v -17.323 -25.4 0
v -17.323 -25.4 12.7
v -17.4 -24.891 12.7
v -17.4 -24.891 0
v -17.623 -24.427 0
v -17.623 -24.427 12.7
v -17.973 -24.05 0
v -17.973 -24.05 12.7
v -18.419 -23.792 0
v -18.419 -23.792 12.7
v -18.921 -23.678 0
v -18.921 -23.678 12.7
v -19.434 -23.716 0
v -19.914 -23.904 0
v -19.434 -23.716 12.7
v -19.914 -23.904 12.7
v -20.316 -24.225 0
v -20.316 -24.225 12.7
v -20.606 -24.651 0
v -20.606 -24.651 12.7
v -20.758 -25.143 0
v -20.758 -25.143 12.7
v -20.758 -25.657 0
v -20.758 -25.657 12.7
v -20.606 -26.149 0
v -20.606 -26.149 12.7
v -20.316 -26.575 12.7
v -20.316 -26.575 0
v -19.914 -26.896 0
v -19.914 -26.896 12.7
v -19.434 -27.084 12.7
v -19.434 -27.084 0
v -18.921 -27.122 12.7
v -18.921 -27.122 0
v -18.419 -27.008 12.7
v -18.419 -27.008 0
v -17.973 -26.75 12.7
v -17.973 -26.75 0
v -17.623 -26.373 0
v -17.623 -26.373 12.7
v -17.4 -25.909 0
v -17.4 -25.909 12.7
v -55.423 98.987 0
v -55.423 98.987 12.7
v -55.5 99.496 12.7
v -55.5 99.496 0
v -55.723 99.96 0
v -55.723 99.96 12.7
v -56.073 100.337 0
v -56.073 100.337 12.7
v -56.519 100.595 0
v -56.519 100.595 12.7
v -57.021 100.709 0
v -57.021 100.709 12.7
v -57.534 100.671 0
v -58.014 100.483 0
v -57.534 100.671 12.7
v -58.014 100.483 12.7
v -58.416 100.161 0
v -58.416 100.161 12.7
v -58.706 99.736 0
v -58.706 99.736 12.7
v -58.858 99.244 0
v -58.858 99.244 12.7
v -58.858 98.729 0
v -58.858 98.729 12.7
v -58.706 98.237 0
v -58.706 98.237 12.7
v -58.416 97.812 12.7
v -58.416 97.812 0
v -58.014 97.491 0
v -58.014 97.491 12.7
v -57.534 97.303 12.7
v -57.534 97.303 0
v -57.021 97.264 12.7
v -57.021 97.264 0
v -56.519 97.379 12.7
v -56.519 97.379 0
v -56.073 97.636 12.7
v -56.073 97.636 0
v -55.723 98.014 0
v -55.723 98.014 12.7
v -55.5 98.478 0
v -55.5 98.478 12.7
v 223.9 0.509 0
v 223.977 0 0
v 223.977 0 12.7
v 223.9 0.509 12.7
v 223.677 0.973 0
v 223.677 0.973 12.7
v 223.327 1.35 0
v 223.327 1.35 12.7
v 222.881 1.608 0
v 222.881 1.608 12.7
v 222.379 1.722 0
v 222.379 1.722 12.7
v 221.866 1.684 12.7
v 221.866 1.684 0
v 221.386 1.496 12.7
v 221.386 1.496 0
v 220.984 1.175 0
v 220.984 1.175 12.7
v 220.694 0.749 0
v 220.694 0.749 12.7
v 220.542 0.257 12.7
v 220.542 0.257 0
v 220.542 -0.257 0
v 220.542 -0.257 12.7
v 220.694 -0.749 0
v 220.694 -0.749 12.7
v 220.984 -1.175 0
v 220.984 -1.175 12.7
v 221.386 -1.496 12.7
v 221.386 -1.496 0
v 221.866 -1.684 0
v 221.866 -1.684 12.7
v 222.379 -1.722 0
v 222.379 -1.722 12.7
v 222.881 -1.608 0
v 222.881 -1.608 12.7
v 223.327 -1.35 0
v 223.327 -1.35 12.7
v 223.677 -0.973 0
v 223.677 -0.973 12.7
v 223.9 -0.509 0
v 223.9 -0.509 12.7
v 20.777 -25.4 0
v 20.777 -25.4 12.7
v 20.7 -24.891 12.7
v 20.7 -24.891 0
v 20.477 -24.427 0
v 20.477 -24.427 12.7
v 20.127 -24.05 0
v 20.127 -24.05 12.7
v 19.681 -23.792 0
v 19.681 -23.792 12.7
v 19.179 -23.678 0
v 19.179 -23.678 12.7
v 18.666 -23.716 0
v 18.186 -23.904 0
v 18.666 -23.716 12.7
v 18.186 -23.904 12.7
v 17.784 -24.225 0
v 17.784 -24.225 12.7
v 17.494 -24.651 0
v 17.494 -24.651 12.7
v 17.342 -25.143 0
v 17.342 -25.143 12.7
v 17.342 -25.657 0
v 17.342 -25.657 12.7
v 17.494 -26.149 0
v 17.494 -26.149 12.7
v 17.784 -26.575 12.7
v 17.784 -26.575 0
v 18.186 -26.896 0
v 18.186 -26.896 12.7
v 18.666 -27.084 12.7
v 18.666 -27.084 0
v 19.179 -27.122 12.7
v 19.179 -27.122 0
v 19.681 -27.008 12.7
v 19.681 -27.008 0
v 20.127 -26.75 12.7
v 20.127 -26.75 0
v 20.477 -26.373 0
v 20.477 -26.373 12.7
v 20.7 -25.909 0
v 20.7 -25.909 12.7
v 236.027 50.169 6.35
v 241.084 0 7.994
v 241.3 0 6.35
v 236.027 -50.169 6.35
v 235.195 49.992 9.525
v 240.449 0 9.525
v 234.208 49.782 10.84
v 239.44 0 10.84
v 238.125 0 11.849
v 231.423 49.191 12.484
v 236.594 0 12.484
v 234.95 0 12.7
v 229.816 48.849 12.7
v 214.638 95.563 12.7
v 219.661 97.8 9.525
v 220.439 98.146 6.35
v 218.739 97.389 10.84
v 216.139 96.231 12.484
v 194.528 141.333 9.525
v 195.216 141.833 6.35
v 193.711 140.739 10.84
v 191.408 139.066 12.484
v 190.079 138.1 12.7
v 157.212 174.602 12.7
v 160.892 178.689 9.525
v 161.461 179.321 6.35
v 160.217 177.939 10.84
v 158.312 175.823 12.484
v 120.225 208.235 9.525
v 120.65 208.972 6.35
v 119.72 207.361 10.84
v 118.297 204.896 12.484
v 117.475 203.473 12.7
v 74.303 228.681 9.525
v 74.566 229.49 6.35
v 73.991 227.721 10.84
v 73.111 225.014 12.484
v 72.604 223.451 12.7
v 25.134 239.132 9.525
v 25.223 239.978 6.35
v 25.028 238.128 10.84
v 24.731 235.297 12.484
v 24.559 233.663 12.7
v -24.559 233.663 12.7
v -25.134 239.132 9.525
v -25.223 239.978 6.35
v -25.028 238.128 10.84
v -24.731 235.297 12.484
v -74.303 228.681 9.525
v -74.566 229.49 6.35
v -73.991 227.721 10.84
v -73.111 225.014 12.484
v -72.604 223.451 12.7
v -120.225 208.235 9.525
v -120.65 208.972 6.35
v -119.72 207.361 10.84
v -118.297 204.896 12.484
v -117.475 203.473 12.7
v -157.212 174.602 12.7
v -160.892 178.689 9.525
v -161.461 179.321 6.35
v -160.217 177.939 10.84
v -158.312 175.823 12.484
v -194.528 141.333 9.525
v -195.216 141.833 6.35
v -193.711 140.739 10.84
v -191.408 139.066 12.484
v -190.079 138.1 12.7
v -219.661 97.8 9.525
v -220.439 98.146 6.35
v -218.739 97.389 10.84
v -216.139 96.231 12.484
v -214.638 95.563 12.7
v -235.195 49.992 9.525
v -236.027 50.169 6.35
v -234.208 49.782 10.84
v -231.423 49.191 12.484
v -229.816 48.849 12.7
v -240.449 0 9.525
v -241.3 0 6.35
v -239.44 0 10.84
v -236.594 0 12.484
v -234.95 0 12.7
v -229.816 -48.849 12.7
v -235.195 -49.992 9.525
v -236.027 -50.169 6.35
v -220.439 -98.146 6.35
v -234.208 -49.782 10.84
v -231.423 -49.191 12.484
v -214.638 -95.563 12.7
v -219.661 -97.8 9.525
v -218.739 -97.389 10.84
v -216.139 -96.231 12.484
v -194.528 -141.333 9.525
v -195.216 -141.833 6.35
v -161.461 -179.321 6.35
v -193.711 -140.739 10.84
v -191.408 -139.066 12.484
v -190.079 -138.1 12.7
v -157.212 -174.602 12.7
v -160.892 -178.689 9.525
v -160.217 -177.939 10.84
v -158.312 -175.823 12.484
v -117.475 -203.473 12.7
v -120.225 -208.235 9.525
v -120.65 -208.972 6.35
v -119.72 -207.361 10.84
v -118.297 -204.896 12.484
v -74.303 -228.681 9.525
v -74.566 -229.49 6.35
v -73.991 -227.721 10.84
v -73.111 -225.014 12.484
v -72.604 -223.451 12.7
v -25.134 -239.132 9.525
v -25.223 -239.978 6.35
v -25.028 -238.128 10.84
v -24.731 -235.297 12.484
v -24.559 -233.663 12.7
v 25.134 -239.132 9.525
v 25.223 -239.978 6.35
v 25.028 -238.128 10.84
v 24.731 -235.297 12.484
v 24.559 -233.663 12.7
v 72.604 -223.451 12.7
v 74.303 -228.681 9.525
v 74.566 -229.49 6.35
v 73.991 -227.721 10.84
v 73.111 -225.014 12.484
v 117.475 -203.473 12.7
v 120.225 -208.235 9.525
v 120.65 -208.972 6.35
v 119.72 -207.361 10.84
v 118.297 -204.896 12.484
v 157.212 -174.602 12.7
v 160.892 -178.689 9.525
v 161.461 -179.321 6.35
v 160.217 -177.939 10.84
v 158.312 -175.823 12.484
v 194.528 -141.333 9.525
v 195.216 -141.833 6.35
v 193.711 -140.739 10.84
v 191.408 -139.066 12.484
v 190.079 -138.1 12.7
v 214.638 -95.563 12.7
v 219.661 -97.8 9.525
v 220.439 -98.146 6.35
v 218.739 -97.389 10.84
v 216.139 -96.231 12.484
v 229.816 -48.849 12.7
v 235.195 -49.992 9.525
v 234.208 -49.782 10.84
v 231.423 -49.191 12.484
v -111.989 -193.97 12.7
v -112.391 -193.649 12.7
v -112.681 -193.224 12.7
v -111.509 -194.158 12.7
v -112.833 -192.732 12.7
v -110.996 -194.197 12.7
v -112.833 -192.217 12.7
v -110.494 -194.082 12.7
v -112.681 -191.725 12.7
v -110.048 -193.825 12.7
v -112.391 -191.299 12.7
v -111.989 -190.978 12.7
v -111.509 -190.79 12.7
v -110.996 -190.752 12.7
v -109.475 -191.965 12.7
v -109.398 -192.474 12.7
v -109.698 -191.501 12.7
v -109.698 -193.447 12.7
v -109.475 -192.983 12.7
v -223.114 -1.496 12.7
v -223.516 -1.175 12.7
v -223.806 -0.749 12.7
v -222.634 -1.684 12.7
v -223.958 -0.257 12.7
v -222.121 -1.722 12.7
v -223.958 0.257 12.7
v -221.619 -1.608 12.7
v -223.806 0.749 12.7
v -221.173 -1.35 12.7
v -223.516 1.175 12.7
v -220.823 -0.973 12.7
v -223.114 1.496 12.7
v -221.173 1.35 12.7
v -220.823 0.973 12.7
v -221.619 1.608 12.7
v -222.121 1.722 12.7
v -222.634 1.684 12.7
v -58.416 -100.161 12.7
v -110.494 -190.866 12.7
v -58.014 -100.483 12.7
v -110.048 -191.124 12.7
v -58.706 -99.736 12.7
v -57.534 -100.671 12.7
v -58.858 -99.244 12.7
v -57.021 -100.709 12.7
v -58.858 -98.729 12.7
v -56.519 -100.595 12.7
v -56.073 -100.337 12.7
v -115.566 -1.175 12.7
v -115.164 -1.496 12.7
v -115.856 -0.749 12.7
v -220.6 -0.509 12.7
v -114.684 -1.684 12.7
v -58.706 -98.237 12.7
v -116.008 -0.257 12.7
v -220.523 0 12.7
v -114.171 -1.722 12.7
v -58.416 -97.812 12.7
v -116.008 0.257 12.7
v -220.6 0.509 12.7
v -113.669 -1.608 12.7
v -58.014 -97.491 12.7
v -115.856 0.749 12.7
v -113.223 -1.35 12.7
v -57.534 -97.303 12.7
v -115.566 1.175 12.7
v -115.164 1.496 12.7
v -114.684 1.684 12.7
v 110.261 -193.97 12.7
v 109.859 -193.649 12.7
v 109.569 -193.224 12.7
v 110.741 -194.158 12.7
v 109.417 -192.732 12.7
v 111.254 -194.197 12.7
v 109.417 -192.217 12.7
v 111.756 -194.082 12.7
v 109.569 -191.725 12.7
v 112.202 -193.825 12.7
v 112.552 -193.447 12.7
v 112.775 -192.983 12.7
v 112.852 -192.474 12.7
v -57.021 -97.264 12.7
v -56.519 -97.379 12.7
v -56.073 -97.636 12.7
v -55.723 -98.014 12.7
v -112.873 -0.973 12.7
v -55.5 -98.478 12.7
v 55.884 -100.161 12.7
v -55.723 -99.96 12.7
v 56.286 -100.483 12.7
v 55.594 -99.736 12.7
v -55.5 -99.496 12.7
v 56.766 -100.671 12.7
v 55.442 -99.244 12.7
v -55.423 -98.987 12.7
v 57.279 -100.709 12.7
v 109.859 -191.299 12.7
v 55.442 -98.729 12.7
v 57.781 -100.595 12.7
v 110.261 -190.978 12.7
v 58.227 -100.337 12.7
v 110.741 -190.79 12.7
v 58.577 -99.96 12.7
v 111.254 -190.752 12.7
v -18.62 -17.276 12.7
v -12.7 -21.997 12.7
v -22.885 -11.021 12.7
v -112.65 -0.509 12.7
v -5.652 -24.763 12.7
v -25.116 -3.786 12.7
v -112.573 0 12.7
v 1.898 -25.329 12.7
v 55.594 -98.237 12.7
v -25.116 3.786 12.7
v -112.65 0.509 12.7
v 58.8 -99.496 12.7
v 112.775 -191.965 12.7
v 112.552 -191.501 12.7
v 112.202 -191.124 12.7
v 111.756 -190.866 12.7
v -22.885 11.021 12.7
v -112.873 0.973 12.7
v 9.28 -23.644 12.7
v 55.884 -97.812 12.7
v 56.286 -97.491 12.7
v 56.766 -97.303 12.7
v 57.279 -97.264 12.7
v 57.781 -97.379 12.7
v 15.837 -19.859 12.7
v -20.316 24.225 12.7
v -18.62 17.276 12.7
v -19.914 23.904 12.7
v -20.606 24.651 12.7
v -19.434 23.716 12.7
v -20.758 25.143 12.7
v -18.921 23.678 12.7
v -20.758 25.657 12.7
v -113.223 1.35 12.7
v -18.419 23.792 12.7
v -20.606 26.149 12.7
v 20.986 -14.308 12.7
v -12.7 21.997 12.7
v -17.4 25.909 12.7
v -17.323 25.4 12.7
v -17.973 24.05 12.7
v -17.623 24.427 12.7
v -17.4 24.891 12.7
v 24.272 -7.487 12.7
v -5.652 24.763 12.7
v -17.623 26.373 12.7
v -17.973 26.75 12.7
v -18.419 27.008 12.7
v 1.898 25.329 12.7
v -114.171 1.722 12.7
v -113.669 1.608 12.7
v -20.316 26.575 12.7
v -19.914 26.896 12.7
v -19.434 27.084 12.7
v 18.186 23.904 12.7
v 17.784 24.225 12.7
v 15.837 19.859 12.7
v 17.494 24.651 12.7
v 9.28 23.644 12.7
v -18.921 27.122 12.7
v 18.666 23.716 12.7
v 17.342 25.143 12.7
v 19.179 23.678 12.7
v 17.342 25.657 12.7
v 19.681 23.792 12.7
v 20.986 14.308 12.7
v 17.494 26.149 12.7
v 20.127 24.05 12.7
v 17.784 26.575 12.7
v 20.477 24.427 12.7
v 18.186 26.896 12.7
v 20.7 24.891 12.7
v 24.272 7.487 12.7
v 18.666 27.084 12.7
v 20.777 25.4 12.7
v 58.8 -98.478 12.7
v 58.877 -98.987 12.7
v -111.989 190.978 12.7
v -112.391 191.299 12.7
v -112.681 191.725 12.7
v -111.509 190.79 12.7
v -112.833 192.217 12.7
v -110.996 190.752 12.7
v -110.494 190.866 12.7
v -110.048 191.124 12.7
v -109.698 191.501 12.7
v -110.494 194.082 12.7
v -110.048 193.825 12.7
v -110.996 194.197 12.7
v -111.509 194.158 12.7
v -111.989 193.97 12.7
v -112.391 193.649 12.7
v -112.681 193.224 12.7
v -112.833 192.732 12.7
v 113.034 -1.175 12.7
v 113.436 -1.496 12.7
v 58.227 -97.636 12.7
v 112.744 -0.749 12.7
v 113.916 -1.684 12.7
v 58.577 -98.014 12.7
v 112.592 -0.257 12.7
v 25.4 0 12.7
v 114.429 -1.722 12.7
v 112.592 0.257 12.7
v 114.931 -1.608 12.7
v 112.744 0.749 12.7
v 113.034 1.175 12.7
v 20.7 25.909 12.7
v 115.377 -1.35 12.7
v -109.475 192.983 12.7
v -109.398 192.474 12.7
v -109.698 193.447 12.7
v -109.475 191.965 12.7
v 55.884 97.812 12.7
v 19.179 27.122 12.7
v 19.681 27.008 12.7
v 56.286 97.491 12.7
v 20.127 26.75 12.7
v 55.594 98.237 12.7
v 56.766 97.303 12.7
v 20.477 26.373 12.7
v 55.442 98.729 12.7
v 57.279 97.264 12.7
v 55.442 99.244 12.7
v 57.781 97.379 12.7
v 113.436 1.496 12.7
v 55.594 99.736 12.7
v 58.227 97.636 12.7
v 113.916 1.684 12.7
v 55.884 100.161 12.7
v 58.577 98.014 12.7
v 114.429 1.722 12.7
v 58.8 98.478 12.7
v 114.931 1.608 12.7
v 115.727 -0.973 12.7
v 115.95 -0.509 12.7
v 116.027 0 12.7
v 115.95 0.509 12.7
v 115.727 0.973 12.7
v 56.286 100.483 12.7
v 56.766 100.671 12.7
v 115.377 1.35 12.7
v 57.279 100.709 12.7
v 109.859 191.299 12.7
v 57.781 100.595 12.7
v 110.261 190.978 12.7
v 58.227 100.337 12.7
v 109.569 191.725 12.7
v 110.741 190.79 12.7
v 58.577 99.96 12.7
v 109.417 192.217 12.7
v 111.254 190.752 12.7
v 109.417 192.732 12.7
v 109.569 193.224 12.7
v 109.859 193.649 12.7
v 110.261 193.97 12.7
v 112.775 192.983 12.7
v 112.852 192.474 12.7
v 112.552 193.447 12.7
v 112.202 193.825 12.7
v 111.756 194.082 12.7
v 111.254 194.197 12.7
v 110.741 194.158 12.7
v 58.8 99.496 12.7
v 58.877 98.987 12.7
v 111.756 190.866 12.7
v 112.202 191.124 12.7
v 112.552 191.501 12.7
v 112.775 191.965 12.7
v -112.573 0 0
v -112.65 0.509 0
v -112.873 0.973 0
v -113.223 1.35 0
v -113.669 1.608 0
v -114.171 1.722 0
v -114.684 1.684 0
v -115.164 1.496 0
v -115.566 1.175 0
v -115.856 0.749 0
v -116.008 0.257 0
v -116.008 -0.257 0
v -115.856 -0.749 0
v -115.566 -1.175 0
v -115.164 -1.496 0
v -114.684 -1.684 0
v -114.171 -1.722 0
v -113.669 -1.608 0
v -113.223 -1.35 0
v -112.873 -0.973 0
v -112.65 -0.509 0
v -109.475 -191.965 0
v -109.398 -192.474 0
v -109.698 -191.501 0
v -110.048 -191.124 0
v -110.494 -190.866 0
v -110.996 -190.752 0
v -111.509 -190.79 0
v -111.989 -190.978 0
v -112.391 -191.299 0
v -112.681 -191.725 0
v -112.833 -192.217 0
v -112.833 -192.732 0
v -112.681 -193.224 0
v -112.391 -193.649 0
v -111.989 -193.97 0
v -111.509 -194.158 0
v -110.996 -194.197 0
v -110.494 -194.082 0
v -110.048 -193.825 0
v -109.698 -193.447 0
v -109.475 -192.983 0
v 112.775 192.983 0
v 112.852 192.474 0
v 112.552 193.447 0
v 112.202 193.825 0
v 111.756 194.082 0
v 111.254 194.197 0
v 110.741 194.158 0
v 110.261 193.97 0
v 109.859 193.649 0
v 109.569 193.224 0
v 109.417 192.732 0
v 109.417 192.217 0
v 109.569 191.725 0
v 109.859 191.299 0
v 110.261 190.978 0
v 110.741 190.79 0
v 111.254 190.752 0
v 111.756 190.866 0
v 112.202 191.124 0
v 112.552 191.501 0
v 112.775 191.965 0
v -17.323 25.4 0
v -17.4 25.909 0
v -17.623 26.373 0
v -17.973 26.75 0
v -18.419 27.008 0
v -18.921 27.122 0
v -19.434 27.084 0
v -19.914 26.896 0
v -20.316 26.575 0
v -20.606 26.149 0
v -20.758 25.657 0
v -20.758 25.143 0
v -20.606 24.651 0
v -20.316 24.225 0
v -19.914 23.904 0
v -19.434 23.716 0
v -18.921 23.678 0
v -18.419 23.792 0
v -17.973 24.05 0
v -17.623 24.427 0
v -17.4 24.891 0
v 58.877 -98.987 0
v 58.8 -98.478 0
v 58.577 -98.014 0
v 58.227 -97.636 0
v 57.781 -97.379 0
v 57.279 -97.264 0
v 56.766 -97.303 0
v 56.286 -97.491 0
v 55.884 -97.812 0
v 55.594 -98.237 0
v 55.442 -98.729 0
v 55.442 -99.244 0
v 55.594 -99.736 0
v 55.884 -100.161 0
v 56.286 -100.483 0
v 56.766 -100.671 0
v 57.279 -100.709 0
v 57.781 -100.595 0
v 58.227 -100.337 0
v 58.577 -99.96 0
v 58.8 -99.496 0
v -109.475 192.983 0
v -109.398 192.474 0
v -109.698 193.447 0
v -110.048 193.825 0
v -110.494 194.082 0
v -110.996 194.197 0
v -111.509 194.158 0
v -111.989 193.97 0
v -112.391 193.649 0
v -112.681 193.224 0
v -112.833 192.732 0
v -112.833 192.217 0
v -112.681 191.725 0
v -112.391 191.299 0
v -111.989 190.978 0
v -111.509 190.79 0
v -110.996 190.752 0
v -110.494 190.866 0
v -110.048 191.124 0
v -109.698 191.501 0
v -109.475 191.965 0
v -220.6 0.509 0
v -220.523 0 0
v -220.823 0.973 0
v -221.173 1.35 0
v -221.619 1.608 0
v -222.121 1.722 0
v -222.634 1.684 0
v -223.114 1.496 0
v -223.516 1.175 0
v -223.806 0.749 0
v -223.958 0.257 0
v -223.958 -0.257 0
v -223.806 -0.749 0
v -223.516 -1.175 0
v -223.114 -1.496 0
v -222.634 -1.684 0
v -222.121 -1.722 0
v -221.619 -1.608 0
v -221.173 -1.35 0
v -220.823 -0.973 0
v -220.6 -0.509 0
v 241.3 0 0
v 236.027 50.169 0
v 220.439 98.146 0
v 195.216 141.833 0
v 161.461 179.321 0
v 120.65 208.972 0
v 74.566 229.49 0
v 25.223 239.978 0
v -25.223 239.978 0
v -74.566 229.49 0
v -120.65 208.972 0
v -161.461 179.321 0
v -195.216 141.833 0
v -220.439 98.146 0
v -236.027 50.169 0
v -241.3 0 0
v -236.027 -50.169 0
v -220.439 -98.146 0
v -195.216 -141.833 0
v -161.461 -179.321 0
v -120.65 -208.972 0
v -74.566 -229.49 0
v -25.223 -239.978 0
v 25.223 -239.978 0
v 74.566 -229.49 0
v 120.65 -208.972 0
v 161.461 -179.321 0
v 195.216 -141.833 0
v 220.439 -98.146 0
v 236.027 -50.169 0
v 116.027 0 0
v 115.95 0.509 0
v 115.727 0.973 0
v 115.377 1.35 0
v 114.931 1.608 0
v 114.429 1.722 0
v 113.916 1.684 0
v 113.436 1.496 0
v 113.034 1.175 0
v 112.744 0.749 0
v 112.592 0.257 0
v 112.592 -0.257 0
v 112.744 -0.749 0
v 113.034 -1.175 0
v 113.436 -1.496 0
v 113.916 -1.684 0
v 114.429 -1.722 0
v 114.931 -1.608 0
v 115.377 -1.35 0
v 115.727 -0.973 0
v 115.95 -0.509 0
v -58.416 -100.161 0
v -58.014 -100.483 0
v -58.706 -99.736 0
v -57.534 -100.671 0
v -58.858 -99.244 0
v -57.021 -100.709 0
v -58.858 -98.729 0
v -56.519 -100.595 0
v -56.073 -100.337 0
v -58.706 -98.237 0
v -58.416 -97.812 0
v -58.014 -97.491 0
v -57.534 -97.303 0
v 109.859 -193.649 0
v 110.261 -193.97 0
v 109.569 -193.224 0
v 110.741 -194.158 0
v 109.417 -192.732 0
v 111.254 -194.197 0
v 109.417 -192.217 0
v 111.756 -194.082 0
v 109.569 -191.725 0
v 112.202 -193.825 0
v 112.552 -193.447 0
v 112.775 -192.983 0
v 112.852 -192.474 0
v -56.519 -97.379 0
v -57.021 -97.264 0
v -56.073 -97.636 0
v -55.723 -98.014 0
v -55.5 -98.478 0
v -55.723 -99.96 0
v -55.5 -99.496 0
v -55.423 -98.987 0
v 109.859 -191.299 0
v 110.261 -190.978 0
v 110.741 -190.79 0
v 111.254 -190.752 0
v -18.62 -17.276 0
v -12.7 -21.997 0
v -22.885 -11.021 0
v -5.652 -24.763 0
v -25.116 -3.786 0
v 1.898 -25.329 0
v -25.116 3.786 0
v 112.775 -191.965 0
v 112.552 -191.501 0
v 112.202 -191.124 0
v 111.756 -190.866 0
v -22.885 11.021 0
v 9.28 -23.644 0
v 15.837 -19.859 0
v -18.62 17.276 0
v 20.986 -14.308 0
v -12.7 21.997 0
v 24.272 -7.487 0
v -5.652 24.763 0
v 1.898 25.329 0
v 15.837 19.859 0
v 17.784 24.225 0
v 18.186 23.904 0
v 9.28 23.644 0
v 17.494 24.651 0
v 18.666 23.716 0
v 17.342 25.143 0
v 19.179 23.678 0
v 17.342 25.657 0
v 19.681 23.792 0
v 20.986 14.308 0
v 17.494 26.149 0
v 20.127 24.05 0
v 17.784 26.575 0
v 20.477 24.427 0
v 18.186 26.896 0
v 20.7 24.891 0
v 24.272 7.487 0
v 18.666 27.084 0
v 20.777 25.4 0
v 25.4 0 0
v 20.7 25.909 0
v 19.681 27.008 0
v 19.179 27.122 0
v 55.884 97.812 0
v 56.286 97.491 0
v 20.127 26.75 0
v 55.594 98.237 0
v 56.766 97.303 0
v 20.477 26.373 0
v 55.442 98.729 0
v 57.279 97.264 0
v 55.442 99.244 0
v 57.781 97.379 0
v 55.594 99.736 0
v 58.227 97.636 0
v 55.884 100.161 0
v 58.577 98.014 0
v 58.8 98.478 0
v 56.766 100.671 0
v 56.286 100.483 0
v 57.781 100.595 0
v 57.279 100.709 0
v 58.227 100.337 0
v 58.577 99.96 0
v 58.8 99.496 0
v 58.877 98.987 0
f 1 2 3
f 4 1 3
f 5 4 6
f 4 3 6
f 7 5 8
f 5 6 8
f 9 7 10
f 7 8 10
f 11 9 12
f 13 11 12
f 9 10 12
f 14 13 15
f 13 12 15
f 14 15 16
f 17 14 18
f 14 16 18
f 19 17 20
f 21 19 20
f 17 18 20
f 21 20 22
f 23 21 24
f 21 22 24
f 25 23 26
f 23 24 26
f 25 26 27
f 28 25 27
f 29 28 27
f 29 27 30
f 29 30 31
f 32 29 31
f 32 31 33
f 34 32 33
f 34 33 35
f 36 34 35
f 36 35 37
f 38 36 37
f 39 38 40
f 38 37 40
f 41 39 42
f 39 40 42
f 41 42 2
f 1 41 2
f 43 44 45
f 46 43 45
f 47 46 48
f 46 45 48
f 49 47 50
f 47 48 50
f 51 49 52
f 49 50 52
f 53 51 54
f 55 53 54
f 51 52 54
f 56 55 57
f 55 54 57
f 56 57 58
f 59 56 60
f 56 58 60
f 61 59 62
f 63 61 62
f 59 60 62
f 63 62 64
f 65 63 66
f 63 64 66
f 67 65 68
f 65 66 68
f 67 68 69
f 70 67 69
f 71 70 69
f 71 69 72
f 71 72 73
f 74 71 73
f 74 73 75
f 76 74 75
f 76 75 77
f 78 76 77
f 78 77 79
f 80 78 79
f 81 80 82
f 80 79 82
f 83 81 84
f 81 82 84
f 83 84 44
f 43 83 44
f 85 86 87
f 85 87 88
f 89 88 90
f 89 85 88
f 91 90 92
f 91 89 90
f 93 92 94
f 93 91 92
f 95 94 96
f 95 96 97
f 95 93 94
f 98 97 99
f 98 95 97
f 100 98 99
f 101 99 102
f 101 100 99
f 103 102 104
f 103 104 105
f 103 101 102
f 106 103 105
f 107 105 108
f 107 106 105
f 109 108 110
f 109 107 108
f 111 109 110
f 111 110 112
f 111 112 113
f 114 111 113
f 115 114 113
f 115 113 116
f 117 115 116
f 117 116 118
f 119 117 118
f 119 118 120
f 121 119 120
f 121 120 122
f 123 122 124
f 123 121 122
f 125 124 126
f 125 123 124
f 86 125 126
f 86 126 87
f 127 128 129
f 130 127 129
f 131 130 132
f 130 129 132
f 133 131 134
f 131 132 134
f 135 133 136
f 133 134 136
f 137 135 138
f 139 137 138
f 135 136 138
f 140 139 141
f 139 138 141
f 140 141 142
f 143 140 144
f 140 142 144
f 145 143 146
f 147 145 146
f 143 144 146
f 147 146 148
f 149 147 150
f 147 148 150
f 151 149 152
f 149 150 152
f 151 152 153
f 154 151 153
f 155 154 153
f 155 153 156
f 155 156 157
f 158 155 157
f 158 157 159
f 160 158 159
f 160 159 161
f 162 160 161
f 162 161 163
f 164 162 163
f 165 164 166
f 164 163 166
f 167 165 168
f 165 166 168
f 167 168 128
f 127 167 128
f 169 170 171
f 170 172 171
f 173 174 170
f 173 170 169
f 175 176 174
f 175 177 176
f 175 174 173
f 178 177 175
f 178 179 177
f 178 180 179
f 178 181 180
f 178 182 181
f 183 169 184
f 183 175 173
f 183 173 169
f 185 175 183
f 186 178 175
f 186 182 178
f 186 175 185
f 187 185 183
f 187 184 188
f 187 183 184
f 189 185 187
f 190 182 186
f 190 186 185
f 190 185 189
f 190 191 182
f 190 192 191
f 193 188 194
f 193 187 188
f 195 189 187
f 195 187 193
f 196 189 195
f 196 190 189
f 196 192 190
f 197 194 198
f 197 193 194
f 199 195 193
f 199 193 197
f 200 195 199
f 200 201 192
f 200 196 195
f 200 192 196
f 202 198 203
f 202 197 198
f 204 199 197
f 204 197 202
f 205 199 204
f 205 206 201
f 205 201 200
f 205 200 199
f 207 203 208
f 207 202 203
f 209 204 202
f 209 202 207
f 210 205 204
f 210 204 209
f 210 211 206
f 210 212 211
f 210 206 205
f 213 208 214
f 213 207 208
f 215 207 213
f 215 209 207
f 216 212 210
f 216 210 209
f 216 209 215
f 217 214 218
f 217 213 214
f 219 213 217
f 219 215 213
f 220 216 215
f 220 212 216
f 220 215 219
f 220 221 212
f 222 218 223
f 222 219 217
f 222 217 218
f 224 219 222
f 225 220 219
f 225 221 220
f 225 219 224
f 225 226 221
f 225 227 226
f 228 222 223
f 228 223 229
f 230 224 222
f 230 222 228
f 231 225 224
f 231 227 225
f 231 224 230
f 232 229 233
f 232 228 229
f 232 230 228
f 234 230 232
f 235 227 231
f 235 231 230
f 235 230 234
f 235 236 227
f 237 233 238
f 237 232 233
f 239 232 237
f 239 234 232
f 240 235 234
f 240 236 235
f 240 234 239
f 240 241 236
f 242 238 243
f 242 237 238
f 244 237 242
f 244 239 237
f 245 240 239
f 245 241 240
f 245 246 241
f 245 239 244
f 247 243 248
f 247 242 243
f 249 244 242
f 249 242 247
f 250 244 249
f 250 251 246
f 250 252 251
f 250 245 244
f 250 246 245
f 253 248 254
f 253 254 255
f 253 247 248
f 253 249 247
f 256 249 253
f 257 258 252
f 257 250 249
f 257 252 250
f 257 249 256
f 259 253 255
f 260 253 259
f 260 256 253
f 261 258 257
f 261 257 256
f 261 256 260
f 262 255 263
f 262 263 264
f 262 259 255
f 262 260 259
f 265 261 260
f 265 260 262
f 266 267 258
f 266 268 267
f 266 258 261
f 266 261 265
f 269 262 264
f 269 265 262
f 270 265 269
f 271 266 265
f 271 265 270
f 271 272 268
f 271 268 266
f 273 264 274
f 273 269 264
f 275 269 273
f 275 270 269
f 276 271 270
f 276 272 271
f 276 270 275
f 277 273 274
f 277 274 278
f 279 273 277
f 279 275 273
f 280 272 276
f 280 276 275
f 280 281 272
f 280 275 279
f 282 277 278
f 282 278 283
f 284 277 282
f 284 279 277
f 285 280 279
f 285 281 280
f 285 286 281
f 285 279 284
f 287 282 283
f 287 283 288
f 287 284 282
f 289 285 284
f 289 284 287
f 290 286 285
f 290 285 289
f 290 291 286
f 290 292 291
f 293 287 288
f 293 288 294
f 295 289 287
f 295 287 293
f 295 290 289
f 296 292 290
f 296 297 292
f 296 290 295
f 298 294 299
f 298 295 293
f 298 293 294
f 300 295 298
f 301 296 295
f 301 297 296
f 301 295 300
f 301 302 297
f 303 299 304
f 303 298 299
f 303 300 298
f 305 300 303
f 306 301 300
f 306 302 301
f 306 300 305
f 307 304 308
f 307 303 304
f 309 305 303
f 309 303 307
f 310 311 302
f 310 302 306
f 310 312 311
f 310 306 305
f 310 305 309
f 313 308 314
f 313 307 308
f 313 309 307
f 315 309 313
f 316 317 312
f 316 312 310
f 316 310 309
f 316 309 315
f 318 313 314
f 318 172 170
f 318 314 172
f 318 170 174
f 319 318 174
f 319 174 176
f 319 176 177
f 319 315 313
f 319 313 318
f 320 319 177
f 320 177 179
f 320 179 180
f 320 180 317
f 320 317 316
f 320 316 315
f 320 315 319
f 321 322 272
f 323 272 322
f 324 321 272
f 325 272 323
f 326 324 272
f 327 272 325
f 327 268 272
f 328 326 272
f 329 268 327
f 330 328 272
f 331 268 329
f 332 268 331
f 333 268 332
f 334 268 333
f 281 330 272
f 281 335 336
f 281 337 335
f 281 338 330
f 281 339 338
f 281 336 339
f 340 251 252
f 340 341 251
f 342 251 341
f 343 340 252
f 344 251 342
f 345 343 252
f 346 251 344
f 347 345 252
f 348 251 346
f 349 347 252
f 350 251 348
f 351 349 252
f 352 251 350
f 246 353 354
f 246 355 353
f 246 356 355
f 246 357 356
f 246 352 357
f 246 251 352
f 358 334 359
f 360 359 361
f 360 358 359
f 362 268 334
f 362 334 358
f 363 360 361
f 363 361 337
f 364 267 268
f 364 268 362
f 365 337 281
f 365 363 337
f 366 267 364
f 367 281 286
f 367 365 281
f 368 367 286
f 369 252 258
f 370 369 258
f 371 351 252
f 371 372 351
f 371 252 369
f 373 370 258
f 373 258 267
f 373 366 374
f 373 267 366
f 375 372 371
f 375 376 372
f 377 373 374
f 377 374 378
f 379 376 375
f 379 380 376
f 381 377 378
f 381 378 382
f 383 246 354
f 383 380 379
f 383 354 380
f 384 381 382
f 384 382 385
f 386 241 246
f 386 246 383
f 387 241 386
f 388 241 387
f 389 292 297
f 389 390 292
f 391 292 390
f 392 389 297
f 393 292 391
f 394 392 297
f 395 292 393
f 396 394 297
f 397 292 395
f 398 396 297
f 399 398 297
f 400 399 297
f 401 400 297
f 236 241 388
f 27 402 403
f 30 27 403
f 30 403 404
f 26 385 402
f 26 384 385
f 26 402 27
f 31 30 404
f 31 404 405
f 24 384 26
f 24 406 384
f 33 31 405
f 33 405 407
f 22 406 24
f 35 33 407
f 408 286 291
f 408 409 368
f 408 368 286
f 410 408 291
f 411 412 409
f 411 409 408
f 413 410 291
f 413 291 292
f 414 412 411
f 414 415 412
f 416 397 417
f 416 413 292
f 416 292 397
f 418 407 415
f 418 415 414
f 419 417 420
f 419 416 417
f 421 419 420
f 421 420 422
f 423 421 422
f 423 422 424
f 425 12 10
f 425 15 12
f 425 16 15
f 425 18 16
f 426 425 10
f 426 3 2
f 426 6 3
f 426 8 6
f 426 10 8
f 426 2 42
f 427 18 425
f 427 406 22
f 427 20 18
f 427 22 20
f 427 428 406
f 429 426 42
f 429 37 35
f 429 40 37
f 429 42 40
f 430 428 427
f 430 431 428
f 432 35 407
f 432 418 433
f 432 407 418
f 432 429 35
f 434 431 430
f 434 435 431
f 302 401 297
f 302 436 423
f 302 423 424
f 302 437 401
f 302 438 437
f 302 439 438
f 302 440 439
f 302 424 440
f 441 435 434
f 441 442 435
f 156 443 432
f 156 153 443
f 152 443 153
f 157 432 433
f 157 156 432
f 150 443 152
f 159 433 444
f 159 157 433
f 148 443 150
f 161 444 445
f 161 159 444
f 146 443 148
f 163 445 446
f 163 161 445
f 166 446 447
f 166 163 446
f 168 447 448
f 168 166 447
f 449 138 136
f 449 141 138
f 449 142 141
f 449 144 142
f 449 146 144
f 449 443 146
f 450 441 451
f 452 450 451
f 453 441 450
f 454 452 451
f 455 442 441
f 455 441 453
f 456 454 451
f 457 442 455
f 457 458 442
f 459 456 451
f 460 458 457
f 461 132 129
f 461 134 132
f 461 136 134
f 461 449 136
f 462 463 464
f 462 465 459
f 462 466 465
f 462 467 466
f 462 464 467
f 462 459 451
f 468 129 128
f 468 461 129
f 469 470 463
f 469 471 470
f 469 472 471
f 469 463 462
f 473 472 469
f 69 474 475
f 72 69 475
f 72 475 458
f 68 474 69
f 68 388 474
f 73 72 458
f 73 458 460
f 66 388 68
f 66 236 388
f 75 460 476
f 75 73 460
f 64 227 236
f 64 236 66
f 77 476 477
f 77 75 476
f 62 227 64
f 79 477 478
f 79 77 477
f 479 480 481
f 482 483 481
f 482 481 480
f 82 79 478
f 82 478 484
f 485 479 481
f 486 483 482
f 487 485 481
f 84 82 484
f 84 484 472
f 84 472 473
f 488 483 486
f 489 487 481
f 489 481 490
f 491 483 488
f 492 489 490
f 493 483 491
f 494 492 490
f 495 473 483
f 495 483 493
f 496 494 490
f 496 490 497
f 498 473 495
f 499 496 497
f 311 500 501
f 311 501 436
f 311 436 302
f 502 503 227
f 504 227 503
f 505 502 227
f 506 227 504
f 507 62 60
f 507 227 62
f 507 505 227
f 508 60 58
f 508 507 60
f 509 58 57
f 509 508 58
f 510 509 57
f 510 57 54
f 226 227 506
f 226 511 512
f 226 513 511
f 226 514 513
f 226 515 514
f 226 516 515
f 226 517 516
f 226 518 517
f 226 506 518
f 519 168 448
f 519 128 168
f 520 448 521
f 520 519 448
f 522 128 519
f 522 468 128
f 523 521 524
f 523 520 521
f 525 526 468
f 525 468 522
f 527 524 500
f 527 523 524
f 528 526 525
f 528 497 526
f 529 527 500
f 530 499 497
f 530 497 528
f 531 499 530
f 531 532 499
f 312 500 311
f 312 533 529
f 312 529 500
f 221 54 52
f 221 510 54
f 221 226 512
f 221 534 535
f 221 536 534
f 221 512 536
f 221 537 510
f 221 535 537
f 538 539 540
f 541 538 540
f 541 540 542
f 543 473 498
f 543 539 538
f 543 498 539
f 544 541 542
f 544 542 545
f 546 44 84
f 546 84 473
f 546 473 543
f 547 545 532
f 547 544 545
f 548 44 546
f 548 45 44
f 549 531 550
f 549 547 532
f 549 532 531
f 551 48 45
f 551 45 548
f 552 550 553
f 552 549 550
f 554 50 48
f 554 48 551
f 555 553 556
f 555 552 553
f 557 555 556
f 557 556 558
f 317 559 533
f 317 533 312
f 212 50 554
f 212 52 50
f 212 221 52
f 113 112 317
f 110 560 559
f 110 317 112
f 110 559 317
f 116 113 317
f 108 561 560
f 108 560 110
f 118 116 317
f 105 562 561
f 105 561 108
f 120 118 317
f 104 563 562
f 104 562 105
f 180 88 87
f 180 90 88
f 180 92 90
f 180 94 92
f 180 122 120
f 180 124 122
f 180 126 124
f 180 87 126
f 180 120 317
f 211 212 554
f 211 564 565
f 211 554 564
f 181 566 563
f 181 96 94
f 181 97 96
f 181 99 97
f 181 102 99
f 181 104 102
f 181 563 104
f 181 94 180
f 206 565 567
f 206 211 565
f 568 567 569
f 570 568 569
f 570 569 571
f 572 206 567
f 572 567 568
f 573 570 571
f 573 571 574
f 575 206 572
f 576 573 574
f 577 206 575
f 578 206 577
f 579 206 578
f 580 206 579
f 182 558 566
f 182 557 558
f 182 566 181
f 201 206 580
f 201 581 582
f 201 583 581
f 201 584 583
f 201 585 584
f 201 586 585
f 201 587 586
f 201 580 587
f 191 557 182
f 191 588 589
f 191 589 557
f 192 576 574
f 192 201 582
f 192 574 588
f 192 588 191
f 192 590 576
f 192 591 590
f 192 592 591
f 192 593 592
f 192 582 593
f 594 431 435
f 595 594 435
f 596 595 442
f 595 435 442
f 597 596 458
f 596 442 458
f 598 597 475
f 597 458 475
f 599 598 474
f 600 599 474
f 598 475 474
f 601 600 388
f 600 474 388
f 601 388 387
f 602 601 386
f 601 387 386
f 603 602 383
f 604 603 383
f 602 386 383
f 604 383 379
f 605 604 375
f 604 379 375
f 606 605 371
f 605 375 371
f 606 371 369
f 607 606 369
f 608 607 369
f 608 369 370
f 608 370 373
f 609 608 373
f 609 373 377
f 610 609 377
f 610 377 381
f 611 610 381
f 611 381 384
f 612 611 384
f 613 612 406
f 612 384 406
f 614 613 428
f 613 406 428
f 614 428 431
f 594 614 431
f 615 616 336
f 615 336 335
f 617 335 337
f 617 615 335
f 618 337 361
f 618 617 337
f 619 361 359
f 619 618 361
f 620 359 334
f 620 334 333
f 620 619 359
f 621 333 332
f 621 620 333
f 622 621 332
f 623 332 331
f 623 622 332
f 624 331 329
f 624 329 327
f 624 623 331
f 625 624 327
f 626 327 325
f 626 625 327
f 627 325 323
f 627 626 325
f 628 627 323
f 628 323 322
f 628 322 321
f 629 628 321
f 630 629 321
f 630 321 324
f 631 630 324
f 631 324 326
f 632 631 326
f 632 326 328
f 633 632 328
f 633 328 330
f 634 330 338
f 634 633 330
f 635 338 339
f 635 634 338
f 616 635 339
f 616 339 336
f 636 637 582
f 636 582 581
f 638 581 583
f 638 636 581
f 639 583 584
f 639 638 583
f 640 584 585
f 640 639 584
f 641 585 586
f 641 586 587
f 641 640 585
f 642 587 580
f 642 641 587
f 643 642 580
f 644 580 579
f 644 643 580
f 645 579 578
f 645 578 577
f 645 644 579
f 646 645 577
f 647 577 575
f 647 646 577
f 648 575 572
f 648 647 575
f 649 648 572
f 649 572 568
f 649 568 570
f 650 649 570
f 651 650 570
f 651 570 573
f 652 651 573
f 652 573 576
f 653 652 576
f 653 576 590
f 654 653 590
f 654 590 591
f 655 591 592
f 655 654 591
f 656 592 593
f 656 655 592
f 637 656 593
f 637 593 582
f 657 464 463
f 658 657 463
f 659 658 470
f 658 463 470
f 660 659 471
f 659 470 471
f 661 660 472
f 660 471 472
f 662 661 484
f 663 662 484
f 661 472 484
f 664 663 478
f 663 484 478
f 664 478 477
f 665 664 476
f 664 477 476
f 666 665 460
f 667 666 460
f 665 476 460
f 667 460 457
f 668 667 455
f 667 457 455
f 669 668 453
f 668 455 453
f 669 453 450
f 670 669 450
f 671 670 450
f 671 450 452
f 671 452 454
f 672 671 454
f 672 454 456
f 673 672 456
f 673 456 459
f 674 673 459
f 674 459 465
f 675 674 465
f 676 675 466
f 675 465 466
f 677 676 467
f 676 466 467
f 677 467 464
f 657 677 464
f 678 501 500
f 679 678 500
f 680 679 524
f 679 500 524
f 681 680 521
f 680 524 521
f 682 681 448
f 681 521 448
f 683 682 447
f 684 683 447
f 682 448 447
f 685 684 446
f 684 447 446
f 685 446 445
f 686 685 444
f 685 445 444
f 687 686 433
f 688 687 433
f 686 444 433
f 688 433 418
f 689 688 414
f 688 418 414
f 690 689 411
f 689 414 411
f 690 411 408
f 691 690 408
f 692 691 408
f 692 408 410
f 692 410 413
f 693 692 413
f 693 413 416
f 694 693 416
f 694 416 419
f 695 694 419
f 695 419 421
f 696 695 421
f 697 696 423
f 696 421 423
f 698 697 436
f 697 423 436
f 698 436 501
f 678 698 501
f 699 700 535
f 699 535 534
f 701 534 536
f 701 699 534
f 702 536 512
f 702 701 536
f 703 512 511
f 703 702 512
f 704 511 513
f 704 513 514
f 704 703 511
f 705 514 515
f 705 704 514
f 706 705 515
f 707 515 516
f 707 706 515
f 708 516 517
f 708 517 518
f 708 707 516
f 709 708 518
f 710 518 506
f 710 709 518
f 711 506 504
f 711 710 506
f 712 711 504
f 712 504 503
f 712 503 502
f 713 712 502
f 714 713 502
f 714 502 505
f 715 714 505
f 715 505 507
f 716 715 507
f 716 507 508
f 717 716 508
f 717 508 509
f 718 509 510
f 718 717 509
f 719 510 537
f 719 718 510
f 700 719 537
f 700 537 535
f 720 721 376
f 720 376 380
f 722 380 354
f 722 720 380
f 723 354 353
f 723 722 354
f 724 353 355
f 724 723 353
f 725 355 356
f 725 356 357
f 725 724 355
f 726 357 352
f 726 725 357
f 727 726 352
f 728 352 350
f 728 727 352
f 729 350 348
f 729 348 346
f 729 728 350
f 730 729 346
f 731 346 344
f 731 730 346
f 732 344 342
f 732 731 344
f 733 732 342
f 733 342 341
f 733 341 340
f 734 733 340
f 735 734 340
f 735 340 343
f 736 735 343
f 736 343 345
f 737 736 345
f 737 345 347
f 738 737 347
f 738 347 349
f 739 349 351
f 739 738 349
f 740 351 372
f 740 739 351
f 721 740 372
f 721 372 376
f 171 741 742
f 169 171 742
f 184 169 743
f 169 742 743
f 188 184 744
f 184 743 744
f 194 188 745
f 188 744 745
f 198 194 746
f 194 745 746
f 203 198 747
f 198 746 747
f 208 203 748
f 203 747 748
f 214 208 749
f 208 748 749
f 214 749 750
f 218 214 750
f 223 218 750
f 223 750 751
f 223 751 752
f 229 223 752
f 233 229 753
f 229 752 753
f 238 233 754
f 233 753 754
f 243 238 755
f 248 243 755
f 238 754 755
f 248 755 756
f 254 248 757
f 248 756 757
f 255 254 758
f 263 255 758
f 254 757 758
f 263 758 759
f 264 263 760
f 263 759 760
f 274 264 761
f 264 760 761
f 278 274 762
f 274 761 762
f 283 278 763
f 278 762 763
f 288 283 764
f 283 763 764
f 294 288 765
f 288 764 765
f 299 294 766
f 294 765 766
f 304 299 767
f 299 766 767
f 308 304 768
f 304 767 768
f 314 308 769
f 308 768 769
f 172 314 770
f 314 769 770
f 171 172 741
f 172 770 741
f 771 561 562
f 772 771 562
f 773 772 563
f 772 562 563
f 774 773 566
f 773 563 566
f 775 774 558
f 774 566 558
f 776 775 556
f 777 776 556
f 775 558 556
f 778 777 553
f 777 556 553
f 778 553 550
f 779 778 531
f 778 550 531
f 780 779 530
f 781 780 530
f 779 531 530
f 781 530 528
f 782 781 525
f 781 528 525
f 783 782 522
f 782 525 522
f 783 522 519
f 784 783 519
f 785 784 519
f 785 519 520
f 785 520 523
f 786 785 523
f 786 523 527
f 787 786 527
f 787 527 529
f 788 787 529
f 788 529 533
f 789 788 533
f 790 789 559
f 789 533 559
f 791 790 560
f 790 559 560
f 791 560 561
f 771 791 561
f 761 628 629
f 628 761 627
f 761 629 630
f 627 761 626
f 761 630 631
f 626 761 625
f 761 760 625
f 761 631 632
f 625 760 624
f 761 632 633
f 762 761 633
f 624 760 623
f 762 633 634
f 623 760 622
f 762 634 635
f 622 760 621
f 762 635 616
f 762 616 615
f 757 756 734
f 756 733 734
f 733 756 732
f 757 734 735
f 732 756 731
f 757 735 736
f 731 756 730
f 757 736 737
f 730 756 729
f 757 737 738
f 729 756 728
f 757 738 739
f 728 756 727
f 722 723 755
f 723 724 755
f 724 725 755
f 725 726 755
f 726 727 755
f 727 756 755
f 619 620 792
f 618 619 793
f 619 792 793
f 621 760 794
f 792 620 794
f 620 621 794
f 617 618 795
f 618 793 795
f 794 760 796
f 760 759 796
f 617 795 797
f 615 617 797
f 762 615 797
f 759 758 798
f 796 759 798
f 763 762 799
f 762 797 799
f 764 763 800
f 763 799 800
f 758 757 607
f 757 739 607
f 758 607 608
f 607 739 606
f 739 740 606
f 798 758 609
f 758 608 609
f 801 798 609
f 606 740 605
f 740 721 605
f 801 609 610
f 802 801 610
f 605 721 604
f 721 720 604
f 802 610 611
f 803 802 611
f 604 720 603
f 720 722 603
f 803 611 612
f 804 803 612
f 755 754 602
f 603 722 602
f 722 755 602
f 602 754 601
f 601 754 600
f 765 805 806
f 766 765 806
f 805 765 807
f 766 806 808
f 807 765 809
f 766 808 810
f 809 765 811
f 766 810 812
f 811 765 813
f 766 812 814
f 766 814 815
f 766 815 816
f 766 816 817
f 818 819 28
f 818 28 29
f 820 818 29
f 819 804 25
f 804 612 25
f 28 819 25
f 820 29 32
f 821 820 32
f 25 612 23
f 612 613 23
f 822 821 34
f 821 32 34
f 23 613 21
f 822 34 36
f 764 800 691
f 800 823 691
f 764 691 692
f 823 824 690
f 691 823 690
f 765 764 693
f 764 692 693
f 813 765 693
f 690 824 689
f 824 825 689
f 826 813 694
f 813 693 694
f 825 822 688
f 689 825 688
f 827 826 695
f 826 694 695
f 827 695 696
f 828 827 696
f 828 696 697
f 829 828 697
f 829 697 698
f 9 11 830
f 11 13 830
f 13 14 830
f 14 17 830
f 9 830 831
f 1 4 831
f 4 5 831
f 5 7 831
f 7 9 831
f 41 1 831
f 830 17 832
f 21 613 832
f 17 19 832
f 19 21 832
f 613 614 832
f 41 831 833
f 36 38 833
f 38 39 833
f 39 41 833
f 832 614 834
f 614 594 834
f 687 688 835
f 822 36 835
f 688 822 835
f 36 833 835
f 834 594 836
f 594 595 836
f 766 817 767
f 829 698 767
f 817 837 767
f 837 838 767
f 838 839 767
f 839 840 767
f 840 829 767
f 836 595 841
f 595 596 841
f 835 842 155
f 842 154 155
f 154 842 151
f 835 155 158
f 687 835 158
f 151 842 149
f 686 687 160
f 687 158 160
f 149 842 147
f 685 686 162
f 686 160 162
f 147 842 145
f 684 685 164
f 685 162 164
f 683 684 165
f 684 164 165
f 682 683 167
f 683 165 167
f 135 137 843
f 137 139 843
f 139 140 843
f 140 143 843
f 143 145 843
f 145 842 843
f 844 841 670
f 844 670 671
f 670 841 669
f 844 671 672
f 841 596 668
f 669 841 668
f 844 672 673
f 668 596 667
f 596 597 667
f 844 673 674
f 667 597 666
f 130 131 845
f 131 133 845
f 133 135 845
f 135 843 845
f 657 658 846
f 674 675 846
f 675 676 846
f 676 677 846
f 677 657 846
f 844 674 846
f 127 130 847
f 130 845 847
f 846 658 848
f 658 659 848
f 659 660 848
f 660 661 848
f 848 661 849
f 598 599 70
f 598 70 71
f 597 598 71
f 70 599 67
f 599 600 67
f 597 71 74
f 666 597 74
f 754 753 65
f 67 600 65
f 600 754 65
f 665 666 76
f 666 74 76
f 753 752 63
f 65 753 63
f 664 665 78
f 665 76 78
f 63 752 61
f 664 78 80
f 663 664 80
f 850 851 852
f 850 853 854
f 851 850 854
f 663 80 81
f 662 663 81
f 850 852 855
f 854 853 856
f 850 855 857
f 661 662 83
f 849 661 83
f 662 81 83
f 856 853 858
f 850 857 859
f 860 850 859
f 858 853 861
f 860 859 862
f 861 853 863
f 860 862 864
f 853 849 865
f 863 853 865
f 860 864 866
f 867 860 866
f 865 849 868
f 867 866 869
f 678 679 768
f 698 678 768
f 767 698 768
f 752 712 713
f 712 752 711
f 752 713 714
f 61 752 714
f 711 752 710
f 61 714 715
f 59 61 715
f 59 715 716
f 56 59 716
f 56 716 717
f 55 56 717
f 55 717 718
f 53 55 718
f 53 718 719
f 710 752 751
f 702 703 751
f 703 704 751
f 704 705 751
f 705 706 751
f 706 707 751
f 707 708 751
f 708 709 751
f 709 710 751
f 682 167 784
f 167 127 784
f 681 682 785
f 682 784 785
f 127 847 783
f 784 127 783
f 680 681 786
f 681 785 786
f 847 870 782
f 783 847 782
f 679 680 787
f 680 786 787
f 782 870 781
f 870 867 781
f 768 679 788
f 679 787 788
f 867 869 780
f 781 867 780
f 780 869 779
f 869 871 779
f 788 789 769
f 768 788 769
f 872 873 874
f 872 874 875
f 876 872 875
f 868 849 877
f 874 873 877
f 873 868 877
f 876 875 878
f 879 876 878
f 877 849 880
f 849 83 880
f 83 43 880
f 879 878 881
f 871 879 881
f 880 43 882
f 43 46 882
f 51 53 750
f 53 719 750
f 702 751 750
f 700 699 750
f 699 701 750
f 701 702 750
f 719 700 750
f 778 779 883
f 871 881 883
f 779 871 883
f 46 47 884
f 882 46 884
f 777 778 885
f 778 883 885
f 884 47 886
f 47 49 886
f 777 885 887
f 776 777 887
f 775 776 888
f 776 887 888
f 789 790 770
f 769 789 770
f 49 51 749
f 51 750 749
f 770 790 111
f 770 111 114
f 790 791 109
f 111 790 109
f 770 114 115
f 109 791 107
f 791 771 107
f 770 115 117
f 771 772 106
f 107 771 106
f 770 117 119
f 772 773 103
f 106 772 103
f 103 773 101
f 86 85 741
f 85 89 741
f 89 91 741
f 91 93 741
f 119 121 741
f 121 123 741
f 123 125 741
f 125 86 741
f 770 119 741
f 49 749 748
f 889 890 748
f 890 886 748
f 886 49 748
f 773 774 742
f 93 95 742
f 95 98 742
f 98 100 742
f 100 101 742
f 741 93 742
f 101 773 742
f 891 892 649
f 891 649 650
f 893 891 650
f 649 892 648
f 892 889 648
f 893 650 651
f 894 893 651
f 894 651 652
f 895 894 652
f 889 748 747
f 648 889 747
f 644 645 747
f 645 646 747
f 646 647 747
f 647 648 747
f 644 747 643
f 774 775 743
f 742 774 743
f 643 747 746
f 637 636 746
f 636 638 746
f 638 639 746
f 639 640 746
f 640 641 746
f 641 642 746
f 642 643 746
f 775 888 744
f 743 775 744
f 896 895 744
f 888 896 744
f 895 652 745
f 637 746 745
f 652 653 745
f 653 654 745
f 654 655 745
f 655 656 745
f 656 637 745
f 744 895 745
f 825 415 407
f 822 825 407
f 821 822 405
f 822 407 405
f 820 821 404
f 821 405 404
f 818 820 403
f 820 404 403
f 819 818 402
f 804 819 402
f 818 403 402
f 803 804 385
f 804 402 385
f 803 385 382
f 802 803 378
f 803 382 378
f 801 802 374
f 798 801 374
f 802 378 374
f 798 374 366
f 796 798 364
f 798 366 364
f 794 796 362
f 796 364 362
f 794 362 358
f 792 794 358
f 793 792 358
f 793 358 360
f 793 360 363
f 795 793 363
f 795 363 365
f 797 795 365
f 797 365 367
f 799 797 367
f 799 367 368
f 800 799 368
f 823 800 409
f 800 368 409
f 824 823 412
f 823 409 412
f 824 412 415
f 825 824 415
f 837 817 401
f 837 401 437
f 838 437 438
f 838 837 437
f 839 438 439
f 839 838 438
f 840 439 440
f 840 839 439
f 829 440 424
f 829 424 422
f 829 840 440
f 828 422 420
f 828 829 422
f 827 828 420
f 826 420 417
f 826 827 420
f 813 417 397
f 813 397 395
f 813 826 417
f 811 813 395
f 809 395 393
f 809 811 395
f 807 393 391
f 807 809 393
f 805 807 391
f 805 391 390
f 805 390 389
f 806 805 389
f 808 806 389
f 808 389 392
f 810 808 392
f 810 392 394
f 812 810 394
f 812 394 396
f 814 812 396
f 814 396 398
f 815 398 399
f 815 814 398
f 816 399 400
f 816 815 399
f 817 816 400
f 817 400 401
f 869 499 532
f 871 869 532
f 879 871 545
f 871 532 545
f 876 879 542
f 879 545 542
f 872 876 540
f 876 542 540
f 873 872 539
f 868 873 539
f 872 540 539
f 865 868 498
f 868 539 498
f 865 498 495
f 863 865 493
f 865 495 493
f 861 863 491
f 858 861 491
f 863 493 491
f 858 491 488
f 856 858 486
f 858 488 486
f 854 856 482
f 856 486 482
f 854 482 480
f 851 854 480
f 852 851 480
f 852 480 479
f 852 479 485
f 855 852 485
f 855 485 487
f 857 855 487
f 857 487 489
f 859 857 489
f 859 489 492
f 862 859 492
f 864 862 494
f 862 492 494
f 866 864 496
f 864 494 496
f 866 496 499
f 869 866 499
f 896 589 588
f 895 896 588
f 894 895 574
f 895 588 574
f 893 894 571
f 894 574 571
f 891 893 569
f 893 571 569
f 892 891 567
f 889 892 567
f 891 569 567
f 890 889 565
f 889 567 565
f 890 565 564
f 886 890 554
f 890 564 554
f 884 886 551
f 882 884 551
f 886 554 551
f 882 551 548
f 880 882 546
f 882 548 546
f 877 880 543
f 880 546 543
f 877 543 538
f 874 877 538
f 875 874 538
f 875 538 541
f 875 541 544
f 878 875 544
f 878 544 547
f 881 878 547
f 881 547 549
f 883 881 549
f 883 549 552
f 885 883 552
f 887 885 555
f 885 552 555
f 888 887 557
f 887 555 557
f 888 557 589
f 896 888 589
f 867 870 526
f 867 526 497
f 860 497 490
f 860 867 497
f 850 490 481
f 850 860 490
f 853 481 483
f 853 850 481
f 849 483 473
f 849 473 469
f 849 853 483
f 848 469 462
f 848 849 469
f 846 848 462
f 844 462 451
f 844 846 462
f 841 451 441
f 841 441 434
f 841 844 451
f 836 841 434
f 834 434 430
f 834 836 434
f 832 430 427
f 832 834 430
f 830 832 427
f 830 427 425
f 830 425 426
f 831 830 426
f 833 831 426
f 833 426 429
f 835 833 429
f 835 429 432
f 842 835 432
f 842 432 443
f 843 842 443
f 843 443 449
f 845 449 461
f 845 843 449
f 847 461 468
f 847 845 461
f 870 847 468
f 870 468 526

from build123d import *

# Parameters (mm, degrees)
F0_R     = 241.3
F0_R_2   = 1.7272
F0_R_3   = 25.4
F1_DEPTH = 12.7
F2_R     = 1.7272
F3_DEPTH = 12.7
F4_R     = 6.35


with BuildPart() as f1:
    # F0 (on Top) → F1 (new body)
    with BuildSketch(Plane.XY):
        Circle(F0_R)
        with Locations((-111.125, -192.474146)):
            Circle(F0_R_2, mode=Mode.SUBTRACT)
        with Locations((111.125, -192.474146)):
            Circle(F0_R_2, mode=Mode.SUBTRACT)
        with Locations((-222.25, 0)):
            Circle(F0_R_2, mode=Mode.SUBTRACT)
        with Locations((-111.125, 192.474146)):
            Circle(F0_R_2, mode=Mode.SUBTRACT)
        Circle(F0_R_3, mode=Mode.SUBTRACT)
        with Locations((222.25, 0)):
            Circle(F0_R_2, mode=Mode.SUBTRACT)
        with Locations((111.125, 192.474146)):
            Circle(F0_R_2, mode=Mode.SUBTRACT)
    extrude(amount=F1_DEPTH)

    # F2 (on face) → F3 (cut, through all)
    with BuildSketch(Plane.XY.offset(12.7)):
        with Locations((-57.15, 98.986704)):
            Circle(F2_R)
        with Locations((57.15, 98.986704)):
            Circle(F2_R)
        with Locations((-114.3, 0)):
            Circle(F2_R)
        with Locations((-57.15, -98.986704)):
            Circle(F2_R)
        with Locations((57.15, -98.986704)):
            Circle(F2_R)
        with Locations((114.3, 0)):
            Circle(F2_R)
        with Locations((-19.05, -25.4)):
            Circle(F2_R)
        with Locations((19.05, -25.4)):
            Circle(F2_R)
        with Locations((19.05, 25.4)):
            Circle(F2_R)
        with Locations((-19.05, 25.4)):
            Circle(F2_R)
    extrude(amount=-F3_DEPTH, mode=Mode.SUBTRACT)

    # F4
    f4_edges = [f1.edges().sort_by_distance(p)[0] for p in [
        (-241.3, 0, 12.7),
    ]]
    fillet(f4_edges, radius=F4_R)


solid = f1.part
